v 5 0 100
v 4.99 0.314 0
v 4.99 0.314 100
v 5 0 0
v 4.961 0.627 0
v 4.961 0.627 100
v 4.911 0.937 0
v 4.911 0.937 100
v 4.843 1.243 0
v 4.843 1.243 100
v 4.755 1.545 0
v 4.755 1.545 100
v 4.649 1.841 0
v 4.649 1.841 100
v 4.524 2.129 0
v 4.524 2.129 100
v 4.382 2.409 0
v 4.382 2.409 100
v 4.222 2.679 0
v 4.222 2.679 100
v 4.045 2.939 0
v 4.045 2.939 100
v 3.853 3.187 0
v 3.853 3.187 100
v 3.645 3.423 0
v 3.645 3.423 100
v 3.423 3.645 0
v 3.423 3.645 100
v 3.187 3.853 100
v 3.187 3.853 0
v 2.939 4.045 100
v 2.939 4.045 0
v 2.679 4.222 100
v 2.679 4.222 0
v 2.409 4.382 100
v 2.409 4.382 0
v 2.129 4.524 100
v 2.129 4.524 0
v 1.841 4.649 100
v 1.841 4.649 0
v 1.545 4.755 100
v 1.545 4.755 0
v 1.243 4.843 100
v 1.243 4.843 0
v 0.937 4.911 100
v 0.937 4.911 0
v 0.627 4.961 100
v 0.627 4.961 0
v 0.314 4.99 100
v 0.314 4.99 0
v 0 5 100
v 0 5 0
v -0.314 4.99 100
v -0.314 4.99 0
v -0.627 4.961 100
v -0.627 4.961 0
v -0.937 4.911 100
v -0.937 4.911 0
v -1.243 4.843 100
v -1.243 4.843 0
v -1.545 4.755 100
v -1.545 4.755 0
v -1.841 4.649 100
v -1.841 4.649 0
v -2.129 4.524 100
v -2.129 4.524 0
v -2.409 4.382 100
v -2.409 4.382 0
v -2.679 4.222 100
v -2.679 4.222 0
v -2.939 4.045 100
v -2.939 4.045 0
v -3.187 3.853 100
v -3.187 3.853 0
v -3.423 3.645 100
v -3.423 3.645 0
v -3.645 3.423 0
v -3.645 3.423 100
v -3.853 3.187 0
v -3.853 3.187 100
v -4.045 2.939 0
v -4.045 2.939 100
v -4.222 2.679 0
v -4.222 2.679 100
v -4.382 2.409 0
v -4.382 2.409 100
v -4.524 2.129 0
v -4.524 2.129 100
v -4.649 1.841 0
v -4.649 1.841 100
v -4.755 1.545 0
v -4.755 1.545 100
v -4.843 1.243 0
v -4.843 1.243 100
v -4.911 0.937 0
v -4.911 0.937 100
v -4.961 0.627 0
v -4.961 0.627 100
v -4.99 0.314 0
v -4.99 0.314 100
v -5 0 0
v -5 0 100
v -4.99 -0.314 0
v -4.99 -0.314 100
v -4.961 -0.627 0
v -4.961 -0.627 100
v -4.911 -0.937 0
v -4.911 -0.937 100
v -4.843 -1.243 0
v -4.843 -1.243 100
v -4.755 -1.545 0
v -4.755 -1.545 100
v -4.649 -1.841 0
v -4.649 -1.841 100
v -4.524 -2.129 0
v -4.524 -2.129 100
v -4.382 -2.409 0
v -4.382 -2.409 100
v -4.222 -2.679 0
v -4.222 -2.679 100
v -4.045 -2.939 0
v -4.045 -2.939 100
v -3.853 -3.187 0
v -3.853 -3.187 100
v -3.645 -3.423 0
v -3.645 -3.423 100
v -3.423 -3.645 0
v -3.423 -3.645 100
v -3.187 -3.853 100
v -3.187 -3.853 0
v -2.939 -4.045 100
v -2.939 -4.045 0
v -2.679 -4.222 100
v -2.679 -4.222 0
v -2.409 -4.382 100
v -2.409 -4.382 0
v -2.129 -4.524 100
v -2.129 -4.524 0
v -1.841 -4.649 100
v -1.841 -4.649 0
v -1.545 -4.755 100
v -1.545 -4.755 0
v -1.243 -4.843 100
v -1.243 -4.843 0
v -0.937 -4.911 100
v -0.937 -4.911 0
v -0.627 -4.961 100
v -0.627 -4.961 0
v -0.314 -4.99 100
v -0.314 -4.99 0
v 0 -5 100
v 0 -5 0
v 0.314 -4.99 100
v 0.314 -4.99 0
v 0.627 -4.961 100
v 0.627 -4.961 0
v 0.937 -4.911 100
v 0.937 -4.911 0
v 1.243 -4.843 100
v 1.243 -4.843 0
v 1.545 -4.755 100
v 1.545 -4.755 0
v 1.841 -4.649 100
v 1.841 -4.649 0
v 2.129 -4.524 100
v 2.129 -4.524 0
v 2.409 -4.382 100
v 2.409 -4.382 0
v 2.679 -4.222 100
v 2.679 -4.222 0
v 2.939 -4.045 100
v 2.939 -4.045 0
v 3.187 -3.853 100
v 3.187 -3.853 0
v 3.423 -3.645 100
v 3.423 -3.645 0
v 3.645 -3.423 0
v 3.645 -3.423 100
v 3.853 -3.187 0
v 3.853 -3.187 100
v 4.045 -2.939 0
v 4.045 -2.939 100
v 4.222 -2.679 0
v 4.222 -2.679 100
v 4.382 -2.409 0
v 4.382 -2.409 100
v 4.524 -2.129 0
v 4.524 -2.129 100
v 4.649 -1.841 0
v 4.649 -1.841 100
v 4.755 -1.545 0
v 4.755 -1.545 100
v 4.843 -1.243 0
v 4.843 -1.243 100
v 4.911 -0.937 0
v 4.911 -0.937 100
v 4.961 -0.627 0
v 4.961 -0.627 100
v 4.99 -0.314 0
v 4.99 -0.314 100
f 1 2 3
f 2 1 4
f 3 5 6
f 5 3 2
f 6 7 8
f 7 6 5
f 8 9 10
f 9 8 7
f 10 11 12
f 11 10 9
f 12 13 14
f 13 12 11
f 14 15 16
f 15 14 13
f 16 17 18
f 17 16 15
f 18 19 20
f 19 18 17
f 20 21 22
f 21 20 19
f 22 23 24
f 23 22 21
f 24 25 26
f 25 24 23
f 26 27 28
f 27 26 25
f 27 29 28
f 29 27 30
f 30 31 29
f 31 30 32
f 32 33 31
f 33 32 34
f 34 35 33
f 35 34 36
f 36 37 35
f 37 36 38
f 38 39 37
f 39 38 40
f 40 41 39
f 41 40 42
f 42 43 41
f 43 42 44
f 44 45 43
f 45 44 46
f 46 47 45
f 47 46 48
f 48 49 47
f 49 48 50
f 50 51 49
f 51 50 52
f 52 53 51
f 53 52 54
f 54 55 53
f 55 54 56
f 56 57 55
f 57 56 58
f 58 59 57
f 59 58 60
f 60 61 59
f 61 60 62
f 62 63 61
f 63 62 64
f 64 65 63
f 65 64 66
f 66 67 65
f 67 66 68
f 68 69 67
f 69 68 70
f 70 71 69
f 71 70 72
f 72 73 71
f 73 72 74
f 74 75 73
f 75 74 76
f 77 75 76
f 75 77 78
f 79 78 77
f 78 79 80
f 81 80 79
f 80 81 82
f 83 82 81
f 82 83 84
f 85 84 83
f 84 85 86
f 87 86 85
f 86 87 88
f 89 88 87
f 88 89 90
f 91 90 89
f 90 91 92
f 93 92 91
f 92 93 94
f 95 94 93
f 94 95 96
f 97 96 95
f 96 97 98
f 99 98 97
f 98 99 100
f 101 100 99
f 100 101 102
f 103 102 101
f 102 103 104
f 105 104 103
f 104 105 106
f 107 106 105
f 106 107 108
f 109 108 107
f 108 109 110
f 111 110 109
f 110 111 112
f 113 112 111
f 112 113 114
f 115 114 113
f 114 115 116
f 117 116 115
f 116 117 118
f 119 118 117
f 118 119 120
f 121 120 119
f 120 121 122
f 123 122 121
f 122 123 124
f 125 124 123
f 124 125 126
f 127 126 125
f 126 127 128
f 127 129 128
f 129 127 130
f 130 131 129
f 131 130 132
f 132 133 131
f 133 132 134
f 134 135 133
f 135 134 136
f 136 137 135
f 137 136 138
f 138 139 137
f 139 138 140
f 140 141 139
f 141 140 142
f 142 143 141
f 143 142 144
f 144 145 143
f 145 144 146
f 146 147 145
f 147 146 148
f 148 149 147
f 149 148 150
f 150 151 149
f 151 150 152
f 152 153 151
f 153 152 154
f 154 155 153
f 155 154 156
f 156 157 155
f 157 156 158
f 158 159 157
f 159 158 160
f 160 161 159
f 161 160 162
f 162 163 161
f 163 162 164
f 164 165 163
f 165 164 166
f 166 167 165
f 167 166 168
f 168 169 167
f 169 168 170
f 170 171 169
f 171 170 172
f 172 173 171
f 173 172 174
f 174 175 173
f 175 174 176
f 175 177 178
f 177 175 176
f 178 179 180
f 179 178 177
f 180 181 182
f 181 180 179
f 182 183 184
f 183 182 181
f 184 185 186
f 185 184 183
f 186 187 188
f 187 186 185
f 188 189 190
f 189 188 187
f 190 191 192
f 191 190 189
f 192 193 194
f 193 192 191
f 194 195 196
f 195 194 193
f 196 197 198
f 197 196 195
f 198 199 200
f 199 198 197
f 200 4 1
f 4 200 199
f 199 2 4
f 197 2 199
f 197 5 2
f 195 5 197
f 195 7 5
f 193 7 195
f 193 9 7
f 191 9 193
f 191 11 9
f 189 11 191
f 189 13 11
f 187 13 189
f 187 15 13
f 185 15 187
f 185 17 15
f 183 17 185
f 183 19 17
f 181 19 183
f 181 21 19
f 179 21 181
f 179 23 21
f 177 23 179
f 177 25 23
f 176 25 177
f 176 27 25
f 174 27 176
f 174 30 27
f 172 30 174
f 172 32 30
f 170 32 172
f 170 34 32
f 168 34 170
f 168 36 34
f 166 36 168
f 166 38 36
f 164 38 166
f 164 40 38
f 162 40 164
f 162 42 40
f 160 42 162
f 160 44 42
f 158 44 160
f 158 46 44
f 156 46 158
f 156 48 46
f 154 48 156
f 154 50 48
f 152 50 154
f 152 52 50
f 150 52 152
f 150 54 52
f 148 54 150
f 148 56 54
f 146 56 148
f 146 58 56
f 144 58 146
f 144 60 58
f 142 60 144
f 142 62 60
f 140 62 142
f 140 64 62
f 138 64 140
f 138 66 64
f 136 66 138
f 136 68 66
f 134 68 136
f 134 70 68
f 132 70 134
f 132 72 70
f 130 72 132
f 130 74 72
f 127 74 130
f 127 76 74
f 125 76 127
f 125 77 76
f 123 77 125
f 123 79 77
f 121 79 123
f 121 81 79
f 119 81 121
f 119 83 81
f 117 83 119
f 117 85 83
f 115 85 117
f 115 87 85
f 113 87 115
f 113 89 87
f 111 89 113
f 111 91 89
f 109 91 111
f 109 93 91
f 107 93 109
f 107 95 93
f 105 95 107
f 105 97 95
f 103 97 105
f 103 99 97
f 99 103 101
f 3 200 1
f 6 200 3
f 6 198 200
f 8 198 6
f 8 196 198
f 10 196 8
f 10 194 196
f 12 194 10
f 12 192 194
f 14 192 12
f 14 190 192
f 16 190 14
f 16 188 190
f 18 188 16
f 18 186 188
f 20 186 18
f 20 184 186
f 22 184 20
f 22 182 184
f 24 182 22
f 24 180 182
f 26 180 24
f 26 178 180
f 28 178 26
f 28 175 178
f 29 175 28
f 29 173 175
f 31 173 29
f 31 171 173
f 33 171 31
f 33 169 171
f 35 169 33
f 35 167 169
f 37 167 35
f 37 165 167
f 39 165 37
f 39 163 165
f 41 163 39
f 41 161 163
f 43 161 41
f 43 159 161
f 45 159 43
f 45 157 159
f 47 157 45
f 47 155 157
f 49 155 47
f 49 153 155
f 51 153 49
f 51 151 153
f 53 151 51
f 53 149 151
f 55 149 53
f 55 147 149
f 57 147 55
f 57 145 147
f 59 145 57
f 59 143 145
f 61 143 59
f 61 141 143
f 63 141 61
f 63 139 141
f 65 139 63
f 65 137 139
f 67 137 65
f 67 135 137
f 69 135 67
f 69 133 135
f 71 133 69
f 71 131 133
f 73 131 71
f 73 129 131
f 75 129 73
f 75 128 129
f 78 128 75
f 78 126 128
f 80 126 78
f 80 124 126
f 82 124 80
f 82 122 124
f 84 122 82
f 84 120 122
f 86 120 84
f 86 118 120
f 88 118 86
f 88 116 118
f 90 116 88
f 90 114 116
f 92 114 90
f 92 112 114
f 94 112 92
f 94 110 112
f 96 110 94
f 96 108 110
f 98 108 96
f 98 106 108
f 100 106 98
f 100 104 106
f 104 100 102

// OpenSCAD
// Simple Cylinder: 100 mm length, Ø10 mm
// Units: mm

$fn = 100;  // Facet resolution for smoothness (higher = smoother, slower render)

cylinder(h=100, r=10/2);  // h=length, r=radius

// Optional: Rotate for horizontal view (uncomment)
// rotate([90, 0, 0]) cylinder(h=100, r=5);
